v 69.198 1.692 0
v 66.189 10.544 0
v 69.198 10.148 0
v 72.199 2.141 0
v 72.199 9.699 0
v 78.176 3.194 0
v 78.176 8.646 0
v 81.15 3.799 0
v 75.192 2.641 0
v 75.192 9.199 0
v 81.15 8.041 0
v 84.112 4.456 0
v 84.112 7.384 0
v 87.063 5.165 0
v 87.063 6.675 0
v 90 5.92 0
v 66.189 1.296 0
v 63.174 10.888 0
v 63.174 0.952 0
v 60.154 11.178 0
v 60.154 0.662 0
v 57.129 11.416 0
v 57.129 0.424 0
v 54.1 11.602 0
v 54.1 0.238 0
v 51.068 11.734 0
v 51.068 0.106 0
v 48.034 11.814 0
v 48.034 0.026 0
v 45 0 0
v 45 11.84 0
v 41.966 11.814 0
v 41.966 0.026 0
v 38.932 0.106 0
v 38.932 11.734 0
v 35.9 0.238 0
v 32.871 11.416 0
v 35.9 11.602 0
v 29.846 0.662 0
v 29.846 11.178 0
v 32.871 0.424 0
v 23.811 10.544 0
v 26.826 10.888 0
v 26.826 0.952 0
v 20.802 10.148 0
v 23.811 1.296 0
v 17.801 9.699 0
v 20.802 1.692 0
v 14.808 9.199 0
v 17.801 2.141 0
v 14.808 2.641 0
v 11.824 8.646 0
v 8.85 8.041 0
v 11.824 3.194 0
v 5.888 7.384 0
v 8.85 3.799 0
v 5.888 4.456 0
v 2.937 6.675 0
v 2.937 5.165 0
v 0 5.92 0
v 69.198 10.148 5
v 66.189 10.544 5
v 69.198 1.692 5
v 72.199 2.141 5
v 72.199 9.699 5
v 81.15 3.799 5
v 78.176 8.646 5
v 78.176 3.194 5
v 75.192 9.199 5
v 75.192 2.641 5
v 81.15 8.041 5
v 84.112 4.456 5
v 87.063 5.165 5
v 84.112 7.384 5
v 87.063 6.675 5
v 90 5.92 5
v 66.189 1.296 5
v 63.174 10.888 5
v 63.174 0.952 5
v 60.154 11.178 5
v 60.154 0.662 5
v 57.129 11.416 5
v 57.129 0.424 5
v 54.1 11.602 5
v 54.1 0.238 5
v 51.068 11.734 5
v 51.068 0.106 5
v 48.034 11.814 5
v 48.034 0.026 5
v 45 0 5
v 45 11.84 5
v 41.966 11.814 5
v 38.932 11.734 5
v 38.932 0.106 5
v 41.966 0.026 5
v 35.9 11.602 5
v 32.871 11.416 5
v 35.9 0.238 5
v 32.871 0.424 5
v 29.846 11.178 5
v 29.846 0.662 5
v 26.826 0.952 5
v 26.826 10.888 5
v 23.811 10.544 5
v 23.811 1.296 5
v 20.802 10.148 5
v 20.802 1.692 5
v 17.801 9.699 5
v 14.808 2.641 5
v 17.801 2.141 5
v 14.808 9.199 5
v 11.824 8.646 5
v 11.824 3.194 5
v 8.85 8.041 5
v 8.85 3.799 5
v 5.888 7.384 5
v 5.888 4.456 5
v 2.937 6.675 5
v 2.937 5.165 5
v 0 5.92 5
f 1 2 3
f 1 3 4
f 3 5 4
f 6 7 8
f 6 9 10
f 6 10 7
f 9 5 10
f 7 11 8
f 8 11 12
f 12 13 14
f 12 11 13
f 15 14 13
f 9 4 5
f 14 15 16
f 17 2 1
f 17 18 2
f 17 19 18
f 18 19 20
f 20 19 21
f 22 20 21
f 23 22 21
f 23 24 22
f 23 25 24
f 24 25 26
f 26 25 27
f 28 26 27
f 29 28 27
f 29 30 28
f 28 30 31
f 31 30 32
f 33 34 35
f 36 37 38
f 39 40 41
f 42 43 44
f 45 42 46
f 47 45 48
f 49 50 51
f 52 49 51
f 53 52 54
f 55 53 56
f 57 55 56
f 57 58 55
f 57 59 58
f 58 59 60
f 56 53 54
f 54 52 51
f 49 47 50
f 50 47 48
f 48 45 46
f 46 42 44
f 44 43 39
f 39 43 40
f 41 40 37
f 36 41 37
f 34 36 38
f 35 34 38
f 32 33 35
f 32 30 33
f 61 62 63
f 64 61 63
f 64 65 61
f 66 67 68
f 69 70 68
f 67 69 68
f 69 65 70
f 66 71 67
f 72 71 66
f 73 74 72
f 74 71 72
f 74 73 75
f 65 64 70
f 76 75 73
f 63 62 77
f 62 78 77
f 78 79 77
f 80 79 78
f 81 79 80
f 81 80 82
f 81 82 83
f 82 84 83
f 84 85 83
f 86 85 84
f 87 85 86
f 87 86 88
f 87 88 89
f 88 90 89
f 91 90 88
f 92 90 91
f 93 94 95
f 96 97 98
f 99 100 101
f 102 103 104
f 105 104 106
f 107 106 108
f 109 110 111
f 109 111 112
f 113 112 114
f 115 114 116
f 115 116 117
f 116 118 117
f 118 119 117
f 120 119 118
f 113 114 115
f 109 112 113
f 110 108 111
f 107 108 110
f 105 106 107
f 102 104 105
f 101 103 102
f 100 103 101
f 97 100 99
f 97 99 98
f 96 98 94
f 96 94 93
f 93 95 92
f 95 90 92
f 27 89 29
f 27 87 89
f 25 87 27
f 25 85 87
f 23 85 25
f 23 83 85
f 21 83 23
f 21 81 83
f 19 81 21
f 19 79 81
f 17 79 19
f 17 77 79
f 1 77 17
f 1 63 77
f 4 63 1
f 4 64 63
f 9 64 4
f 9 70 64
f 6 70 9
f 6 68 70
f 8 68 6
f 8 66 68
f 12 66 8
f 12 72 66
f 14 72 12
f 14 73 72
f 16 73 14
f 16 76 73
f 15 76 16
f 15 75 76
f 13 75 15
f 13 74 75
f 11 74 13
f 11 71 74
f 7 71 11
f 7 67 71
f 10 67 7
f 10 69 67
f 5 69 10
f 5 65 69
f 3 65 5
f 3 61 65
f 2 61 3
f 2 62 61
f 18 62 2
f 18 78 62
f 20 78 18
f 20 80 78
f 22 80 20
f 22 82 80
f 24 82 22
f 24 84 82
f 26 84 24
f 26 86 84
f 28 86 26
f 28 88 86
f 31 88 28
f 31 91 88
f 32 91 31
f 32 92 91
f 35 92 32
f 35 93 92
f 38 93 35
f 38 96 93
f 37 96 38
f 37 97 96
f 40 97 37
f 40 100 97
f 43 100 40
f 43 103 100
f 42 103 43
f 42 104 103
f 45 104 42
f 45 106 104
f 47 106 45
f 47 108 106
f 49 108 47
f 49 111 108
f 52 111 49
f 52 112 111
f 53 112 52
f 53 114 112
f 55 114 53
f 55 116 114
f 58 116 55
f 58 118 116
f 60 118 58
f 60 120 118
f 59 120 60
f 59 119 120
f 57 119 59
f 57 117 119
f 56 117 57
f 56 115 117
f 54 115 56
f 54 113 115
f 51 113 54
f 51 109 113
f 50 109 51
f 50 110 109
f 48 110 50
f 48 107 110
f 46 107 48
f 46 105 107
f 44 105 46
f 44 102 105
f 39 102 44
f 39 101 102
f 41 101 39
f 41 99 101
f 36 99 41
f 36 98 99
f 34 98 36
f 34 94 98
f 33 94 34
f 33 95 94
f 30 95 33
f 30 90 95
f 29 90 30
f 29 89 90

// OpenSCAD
$fn = 32;

// ----------------------------------------------------------------------
// Arc profile plate: lens, 60 points
// ----------------------------------------------------------------------

// --- parameters (mm) ---
lens_chord = 90;          // chord length of the lens, X
arc_r = 173.87;           // radius of both arcs
arc_angle = 30;           // angle of each arc, degrees
sagitta = 5.92;           // bulge of each arc (half the lens height)
arc_step = 1;             // sampling step of the arcs, degrees
plate_t = 5;              // plate thickness, Z
fit_tol = 0.02;           // declared fit tolerance (prompt contract)
free_tol = 0.2;           // declared free tolerance (prompt contract)

bbox_y = 2 * sagitta;  // full lens height

profile = [[90, 5.92], [87.063, 6.675], [84.112, 7.384], [81.15, 8.041], [78.176, 8.646], [75.192, 9.199], [72.199, 9.699], [69.198, 10.148], [66.189, 10.544], [63.174, 10.888], [60.154, 11.178], [57.129, 11.416], [54.1, 11.602], [51.068, 11.734], [48.034, 11.814], [45, 11.84], [41.966, 11.814], [38.932, 11.734], [35.9, 11.602], [32.871, 11.416], [29.846, 11.178], [26.826, 10.888], [23.811, 10.544], [20.802, 10.148], [17.801, 9.699], [14.808, 9.199], [11.824, 8.646], [8.85, 8.041], [5.888, 7.384], [2.937, 6.675], [0, 5.92], [2.937, 5.165], [5.888, 4.456], [8.85, 3.799], [11.824, 3.194], [14.808, 2.641], [17.801, 2.141], [20.802, 1.692], [23.811, 1.296], [26.826, 0.952], [29.846, 0.662], [32.871, 0.424], [35.9, 0.238], [38.932, 0.106], [41.966, 0.026], [45, 0], [48.034, 0.026], [51.068, 0.106], [54.1, 0.238], [57.129, 0.424], [60.154, 0.662], [63.174, 0.952], [66.189, 1.296], [69.198, 1.692], [72.199, 2.141], [75.192, 2.641], [78.176, 3.194], [81.15, 3.799], [84.112, 4.456], [87.063, 5.165]];  // primary outline, 60 points, counter clockwise

// --- the one profile operation ---
linear_extrude(height = plate_t) polygon(points = profile);
